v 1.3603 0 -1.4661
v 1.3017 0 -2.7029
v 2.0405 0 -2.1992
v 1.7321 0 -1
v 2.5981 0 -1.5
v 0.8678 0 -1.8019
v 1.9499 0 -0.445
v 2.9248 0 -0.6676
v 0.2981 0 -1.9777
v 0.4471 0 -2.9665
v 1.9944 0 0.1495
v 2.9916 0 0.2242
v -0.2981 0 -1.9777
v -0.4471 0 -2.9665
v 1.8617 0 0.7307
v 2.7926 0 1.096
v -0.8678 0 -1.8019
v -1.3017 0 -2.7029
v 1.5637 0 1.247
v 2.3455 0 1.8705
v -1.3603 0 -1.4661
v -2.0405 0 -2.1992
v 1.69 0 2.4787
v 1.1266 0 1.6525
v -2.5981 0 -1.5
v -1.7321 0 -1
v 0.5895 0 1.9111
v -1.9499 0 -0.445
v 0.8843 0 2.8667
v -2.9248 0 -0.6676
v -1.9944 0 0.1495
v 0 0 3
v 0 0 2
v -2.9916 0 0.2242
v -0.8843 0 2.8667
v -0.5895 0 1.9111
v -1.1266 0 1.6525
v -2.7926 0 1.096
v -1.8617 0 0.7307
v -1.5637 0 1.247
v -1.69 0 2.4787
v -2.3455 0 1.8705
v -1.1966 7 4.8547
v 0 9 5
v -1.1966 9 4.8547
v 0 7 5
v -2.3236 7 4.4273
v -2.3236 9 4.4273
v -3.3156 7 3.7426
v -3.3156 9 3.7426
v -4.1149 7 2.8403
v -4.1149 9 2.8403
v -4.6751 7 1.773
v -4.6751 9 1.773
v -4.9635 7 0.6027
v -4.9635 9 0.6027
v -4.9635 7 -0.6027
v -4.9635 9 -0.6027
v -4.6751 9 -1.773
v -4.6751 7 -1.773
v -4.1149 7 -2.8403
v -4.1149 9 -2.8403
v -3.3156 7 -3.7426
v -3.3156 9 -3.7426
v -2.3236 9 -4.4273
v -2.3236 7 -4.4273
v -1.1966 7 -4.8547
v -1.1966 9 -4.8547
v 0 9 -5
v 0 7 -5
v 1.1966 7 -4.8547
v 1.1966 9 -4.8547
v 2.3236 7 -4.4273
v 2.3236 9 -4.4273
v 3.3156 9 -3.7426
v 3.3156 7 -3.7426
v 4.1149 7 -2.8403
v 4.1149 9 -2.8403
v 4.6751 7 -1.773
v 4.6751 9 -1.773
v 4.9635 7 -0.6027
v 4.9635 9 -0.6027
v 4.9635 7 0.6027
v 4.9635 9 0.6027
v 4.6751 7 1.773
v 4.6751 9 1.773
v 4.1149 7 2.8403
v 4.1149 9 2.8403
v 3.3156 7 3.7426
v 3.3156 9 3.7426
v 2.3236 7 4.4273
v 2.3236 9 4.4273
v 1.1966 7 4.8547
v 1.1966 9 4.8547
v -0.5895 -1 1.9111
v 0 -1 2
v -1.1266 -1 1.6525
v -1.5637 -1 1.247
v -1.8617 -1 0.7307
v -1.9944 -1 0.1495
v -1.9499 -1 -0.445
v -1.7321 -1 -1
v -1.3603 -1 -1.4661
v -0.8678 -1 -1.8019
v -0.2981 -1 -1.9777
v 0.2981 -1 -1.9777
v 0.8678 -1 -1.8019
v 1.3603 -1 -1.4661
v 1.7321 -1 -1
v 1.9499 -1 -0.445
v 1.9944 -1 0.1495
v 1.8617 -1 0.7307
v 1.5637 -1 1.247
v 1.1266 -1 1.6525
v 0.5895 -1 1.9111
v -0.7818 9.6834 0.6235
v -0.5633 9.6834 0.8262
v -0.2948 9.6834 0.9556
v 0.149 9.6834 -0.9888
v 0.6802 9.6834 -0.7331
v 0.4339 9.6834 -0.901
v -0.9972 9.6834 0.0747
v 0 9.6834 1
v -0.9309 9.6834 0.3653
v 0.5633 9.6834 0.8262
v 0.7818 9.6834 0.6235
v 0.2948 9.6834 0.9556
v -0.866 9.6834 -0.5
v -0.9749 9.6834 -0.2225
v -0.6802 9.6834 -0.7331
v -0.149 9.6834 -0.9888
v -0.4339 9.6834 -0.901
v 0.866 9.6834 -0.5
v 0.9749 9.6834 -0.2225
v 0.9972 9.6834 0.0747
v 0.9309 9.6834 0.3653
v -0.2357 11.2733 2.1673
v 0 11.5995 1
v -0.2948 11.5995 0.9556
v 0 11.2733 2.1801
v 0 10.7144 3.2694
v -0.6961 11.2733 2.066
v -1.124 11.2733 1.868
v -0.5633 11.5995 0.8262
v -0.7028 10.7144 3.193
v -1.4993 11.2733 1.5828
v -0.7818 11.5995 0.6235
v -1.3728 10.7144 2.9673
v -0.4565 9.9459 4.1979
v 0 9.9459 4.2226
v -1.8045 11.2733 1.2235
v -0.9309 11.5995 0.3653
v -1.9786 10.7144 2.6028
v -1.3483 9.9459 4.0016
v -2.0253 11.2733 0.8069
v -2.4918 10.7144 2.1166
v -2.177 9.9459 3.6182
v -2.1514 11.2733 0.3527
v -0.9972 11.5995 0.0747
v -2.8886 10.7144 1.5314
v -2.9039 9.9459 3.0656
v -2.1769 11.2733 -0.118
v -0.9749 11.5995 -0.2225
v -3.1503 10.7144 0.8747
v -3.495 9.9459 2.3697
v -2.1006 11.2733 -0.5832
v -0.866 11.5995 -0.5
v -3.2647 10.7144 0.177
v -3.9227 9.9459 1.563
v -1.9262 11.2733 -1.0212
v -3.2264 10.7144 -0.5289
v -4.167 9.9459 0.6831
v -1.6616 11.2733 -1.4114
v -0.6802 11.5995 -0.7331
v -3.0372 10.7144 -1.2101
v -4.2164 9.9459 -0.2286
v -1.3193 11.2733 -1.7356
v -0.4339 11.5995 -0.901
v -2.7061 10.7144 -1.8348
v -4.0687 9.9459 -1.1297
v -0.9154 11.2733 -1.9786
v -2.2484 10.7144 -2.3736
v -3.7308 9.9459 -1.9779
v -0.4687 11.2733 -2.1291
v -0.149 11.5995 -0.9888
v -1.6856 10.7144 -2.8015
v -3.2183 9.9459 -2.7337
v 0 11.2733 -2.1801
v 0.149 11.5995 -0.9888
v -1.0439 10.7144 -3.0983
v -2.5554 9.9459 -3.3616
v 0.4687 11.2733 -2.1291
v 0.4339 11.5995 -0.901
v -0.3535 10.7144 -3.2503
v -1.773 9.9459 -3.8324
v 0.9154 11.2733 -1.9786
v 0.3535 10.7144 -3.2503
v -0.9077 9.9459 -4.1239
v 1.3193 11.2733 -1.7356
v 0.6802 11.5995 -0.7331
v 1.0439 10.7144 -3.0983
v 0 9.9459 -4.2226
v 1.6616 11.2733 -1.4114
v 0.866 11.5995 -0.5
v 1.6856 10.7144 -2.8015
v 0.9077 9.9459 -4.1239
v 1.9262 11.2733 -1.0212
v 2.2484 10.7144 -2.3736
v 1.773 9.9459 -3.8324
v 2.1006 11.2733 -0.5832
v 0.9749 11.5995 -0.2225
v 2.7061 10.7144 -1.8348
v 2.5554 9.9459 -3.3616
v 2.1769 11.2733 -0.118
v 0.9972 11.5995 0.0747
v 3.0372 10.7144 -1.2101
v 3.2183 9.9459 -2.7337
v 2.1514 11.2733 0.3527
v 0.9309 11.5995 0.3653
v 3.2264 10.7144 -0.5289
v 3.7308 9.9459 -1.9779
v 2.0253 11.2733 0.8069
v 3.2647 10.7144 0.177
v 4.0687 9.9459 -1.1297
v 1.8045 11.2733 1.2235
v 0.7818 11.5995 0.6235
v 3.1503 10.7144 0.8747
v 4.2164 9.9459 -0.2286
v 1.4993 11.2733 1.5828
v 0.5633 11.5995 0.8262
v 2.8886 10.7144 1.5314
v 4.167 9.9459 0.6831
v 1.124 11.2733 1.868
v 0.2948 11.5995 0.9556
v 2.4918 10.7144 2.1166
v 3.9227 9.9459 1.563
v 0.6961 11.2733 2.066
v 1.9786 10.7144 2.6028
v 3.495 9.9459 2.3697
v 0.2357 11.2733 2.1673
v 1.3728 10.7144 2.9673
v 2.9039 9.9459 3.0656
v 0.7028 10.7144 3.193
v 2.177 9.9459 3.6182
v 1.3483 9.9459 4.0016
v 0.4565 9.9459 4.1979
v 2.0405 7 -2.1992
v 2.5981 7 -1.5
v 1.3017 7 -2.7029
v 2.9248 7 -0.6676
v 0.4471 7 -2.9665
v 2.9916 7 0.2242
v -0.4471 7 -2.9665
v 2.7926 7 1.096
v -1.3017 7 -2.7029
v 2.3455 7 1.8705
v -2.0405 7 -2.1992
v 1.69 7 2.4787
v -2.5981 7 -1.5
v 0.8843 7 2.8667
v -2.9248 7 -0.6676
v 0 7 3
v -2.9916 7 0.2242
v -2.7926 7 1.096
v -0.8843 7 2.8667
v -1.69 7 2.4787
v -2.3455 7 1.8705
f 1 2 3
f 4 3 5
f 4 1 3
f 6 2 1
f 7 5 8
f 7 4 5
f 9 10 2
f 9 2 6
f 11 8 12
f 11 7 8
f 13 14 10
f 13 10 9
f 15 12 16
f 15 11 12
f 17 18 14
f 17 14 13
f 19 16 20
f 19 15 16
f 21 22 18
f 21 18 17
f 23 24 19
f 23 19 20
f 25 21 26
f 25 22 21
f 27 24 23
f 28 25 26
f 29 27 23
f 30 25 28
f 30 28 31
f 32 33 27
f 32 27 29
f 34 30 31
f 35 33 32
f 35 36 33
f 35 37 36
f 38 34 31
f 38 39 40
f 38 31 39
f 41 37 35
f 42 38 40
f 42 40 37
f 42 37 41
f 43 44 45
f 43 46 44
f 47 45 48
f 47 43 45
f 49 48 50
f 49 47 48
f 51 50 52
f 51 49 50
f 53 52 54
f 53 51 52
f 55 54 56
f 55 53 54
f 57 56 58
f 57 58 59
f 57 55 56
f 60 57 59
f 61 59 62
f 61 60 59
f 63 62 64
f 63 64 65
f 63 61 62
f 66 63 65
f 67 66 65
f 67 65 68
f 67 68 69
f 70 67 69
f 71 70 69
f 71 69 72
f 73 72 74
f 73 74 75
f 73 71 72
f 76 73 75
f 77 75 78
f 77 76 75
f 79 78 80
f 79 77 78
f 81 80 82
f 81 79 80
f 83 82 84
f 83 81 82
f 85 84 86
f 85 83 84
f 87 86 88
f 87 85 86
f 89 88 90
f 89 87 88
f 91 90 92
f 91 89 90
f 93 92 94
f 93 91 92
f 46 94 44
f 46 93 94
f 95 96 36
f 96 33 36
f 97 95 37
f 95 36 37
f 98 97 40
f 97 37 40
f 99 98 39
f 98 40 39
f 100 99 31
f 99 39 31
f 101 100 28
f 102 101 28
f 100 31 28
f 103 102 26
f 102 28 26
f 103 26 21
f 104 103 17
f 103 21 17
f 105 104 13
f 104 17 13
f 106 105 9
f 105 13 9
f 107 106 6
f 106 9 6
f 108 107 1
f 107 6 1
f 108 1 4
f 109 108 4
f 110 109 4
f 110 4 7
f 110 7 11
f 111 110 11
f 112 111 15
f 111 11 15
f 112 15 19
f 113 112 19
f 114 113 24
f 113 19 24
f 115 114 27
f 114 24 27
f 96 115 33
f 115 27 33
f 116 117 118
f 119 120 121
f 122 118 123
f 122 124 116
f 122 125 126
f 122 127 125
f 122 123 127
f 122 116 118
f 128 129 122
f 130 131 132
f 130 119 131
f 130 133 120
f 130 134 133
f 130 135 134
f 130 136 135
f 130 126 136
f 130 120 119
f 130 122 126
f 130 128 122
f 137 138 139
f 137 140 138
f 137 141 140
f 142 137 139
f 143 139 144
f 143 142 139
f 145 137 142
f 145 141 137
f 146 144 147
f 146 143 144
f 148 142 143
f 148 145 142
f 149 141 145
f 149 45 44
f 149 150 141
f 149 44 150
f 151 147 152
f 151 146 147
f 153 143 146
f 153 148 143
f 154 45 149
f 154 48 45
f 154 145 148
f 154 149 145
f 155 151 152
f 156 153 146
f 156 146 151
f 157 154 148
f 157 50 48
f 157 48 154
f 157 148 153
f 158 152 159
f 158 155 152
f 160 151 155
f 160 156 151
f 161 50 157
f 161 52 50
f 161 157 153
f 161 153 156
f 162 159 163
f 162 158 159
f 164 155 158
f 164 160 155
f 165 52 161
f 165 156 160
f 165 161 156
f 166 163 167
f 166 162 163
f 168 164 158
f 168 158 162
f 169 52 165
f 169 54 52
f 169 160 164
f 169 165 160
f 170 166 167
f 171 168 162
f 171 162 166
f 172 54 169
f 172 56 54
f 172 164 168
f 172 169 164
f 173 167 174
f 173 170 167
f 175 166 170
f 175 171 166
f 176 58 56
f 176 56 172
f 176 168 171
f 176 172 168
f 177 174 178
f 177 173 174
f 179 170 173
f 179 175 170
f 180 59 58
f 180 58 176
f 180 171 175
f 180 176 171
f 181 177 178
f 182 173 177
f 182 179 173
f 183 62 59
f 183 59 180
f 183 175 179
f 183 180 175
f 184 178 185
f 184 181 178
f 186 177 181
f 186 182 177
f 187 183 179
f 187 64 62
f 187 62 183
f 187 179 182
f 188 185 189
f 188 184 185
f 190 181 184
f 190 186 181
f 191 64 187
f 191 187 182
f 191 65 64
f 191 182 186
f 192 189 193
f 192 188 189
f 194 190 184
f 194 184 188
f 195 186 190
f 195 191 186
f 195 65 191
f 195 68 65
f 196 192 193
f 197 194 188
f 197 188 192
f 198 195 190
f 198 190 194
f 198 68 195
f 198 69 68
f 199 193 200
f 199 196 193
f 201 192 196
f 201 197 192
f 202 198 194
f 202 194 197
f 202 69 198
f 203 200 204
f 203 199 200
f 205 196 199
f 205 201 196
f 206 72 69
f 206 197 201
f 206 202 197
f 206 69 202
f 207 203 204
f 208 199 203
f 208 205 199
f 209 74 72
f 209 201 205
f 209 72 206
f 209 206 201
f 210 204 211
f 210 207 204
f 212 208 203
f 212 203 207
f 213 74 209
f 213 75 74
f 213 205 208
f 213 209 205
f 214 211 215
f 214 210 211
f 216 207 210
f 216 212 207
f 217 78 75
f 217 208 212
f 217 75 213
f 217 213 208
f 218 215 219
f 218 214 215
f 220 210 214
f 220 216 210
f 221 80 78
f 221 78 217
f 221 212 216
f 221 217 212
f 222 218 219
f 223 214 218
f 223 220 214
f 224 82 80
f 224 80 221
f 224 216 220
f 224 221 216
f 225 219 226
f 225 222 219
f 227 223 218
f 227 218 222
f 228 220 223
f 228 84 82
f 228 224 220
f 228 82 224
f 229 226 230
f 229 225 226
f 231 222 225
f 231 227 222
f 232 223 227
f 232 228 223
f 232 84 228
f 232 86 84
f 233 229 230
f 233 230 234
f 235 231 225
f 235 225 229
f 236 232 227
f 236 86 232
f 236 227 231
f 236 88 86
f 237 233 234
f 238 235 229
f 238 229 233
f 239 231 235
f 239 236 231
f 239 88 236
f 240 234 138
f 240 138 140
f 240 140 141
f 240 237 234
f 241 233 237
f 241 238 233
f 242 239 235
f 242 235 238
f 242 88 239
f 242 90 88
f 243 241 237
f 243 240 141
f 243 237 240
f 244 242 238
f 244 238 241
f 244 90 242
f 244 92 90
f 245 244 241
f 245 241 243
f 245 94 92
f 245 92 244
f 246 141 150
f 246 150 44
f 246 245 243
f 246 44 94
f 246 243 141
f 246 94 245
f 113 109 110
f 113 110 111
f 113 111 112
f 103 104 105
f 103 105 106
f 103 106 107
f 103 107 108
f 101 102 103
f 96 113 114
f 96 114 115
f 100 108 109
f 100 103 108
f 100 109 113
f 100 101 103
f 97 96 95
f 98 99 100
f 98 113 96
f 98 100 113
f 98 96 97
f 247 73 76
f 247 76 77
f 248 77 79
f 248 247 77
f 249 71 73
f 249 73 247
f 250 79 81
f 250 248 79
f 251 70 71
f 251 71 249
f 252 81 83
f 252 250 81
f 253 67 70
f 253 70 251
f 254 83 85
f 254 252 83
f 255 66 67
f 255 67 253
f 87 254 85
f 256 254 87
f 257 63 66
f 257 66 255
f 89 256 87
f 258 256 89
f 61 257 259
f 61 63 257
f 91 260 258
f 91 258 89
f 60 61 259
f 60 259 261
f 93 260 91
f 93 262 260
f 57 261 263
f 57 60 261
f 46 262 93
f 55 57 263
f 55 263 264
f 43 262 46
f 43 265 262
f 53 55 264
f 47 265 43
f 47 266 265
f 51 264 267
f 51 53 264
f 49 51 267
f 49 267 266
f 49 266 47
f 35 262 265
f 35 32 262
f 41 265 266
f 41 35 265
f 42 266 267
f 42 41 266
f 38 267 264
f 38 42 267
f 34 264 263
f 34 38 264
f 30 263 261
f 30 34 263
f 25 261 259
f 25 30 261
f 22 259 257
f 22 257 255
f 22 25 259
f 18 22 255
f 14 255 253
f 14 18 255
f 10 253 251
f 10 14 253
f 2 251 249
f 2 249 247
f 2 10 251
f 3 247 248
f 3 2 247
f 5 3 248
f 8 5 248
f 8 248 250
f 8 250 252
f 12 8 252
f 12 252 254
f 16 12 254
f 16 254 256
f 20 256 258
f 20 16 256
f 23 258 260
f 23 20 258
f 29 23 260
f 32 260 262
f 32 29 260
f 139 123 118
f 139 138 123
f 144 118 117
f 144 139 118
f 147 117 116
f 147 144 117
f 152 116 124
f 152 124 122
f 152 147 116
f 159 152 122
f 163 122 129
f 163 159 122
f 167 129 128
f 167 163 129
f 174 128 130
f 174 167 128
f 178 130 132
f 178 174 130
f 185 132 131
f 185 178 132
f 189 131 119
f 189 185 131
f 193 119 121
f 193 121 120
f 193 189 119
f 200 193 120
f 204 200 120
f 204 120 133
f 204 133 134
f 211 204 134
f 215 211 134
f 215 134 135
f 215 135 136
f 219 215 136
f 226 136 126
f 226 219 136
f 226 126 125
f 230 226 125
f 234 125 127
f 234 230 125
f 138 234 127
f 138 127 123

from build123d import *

# Parameters (mm, degrees)
SKETCH1_W = 2
SKETCH1_H = 1


with BuildPart() as part:
    # Sketch1 → Revolve2 (revolve)
    with BuildSketch(Plane.XY, mode=Mode.PRIVATE) as revolve2_sk:
        with Locations((-1, -0.5)):
            Rectangle(SKETCH1_W, SKETCH1_H)
        Polygon((0, 0), (0, 7), (-3, 7), (-3, 0), (-2, 0), align=None)
        Polygon((0, 7), (0, 9), (-5, 9), (-5, 7), (-3, 7), align=None)
        with BuildLine():
            Line((0, 9), (0, 9.68337521))
            Line((0, 9.68337521), (-1, 9.68337521))
            Line((-1, 9.68337521), (-1, 11.599454993))
            ThreePointArc((-1, 11.599454993), (-3.269448205, 10.714350109), (-5, 9))
            Line((-5, 9), (0, 9))
        make_face()
    revolve(revolve2_sk.sketch.rotate(Axis((0, 85.082557183, 0), (0, -1, 0)), 270), axis=Axis((0, 85.082557183, 0), (0, -1, 0)))


solid = part.part
